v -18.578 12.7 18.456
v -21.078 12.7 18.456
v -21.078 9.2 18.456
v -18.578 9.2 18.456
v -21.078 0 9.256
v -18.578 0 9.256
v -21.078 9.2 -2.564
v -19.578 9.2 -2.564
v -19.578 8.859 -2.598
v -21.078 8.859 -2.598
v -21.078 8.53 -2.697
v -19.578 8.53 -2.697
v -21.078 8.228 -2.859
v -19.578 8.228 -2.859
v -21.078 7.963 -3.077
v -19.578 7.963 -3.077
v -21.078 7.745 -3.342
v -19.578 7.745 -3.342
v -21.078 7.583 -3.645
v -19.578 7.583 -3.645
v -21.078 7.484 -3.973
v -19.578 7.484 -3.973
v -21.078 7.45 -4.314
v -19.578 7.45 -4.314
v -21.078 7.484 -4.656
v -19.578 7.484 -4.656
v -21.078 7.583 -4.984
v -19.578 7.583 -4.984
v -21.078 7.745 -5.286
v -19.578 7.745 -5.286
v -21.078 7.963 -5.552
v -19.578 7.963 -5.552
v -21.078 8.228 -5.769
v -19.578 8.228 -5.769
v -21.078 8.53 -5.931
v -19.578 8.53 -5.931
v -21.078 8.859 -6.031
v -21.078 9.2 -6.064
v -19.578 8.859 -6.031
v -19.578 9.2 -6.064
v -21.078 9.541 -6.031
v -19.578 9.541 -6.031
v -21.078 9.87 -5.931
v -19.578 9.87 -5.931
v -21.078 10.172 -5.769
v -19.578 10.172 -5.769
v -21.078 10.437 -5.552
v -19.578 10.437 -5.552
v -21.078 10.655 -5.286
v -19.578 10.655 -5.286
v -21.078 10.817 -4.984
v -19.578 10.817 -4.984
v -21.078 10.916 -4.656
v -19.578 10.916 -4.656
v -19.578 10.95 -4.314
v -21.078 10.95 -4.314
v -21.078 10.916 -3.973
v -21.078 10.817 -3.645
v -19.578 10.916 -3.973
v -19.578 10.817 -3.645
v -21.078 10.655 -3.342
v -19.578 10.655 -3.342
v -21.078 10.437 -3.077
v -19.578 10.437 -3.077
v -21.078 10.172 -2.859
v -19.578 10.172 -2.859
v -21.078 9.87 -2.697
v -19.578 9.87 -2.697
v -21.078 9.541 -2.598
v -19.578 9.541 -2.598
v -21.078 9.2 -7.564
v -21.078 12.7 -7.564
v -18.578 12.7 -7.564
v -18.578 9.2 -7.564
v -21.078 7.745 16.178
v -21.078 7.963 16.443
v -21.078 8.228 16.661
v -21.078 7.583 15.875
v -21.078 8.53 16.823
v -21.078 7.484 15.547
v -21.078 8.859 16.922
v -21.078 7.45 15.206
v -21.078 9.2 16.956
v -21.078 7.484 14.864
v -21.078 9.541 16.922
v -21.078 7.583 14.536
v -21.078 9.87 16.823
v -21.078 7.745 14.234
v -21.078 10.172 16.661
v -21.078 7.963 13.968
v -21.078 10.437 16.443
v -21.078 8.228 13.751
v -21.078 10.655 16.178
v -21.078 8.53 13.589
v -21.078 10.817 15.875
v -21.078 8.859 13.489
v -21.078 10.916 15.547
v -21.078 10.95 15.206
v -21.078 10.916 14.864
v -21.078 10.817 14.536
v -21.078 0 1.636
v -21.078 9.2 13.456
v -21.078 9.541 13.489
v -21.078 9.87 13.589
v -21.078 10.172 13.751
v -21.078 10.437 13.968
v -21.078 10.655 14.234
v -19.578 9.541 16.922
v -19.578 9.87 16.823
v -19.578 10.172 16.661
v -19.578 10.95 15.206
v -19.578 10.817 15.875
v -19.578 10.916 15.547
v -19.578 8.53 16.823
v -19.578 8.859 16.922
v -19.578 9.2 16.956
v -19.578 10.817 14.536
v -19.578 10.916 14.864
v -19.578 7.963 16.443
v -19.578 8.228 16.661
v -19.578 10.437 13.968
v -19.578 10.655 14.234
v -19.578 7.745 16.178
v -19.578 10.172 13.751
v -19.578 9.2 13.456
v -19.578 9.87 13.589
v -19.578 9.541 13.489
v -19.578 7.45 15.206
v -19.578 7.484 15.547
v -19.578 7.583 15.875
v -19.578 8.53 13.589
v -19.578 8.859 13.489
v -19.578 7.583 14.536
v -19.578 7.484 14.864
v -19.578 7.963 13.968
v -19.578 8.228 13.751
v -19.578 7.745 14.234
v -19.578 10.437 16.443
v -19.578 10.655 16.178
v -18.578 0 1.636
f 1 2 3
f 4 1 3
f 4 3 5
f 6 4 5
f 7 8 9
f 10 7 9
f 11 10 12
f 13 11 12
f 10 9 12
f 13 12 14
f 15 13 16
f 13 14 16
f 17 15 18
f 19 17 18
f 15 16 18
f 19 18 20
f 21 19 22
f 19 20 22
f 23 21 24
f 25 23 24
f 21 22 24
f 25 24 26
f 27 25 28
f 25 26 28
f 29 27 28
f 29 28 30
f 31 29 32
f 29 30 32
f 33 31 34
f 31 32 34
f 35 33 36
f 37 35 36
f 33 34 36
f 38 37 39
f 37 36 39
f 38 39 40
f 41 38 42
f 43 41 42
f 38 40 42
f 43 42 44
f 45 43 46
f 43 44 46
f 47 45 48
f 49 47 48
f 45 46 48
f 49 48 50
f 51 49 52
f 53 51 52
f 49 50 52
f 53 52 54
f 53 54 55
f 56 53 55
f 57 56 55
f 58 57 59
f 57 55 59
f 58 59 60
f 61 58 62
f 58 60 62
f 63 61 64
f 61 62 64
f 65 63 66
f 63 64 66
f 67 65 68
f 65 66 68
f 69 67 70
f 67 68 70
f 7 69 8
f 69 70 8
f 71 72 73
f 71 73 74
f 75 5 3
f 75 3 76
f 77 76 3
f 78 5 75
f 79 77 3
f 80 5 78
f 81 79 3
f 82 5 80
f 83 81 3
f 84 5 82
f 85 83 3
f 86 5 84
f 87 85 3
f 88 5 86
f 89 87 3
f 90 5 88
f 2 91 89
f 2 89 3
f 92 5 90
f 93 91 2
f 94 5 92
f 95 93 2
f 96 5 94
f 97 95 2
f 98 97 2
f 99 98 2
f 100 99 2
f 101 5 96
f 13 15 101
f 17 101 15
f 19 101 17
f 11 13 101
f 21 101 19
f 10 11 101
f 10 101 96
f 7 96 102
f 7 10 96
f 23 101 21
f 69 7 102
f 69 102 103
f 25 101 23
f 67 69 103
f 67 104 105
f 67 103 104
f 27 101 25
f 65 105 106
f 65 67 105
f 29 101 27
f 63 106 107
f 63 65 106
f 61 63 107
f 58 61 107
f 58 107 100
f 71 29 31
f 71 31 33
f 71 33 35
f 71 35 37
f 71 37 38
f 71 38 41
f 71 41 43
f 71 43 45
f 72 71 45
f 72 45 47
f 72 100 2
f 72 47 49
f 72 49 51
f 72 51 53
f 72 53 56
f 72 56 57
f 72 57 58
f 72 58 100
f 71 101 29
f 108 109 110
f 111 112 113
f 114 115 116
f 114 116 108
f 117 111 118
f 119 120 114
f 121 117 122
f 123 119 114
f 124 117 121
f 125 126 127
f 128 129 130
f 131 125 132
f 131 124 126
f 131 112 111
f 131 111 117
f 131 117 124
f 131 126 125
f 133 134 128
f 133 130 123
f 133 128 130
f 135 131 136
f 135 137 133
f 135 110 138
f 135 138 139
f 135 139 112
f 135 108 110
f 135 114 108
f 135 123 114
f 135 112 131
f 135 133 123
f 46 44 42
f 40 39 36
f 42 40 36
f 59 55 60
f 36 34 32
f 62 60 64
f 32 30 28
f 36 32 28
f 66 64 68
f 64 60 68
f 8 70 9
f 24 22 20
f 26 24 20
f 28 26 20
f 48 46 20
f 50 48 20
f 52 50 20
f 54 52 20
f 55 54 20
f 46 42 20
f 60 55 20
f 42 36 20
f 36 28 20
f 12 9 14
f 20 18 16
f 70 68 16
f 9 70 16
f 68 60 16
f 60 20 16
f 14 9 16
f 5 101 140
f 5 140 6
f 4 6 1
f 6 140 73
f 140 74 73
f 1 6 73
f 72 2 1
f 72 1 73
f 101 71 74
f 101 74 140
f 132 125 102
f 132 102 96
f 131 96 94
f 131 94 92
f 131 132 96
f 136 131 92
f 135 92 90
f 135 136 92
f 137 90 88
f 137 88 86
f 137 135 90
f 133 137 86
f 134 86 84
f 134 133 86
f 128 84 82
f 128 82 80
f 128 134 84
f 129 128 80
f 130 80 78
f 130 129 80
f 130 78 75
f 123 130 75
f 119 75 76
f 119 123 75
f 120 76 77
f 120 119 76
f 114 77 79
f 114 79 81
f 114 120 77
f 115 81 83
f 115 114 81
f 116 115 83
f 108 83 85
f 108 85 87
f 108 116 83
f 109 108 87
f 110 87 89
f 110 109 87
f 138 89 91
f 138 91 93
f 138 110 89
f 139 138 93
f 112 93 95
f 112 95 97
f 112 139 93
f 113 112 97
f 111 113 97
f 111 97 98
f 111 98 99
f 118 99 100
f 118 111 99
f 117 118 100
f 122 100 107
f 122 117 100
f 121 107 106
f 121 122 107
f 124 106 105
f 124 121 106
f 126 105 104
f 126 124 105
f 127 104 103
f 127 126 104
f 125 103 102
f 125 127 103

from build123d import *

# Parameters (mm, degrees)
STOCK_TEST_FINGER_MICHELLE_V2_1_START = -21.07817965
STOCK_TEST_FINGER_MICHELLE_V2_1_DEPTH = 2.5
CUT_EXTRUDE1_START                    = -1.5
SKETCH1_R                             = 1.75
CUT_EXTRUDE1_DEPTH                    = 1.5
SKETCH2_W                             = 20.99
SKETCH2_H                             = 12.7
CUT_EXTRUDE2_DEPTH                    = 23.542331171


# Read off the part's stored shape, not the designer's step: Stock-test_finger_michelle_V2-1
with BuildPart() as part:
    # Stock-test_finger_michelle_V2-1 outline → Stock-test_finger_michelle_V2-1 (new body)
    with BuildSketch(Plane.YZ.offset(STOCK_TEST_FINGER_MICHELLE_V2_1_START)):
        Polygon((0, -6.34419618), (9.2, -15.54419618), (12.7, -15.54419618), (12.7, 18.45580382), (9.2, 18.45580382), (0, 9.25580382), align=None)
    extrude(amount=STOCK_TEST_FINGER_MICHELLE_V2_1_DEPTH)

    # Sketch1 → Cut-Extrude1 (cut)
    with BuildSketch(Plane.ZY.offset(21.07817965).offset(CUT_EXTRUDE1_START)):
        with Locations(Location((-12.29419618, 9.2, 0), (0, 0, 180))):
            Circle(SKETCH1_R)
        with Locations(Location((15.20580382, 9.2, 0), (0, 0, 180))):
            Circle(SKETCH1_R)
    extrude(amount=CUT_EXTRUDE1_DEPTH, mode=Mode.SUBTRACT)

    # Sketch2 → Cut-Extrude2 (cut, through all)
    with BuildSketch(Plane.ZY.offset(21.07817965)):
        with Locations((-5.04919618, 6.35)):
            Rectangle(SKETCH2_W, SKETCH2_H)
    extrude(amount=-CUT_EXTRUDE2_DEPTH, mode=Mode.SUBTRACT)

    # Mirror1: part across plane


with BuildPart() as part_1:
    add(part.part)
    add(part.part.mirror(Plane(origin=(0, 0, 5.44580382), x_dir=(1, 0, 0), z_dir=(0, 0, -1))))


solid = part_1.part
